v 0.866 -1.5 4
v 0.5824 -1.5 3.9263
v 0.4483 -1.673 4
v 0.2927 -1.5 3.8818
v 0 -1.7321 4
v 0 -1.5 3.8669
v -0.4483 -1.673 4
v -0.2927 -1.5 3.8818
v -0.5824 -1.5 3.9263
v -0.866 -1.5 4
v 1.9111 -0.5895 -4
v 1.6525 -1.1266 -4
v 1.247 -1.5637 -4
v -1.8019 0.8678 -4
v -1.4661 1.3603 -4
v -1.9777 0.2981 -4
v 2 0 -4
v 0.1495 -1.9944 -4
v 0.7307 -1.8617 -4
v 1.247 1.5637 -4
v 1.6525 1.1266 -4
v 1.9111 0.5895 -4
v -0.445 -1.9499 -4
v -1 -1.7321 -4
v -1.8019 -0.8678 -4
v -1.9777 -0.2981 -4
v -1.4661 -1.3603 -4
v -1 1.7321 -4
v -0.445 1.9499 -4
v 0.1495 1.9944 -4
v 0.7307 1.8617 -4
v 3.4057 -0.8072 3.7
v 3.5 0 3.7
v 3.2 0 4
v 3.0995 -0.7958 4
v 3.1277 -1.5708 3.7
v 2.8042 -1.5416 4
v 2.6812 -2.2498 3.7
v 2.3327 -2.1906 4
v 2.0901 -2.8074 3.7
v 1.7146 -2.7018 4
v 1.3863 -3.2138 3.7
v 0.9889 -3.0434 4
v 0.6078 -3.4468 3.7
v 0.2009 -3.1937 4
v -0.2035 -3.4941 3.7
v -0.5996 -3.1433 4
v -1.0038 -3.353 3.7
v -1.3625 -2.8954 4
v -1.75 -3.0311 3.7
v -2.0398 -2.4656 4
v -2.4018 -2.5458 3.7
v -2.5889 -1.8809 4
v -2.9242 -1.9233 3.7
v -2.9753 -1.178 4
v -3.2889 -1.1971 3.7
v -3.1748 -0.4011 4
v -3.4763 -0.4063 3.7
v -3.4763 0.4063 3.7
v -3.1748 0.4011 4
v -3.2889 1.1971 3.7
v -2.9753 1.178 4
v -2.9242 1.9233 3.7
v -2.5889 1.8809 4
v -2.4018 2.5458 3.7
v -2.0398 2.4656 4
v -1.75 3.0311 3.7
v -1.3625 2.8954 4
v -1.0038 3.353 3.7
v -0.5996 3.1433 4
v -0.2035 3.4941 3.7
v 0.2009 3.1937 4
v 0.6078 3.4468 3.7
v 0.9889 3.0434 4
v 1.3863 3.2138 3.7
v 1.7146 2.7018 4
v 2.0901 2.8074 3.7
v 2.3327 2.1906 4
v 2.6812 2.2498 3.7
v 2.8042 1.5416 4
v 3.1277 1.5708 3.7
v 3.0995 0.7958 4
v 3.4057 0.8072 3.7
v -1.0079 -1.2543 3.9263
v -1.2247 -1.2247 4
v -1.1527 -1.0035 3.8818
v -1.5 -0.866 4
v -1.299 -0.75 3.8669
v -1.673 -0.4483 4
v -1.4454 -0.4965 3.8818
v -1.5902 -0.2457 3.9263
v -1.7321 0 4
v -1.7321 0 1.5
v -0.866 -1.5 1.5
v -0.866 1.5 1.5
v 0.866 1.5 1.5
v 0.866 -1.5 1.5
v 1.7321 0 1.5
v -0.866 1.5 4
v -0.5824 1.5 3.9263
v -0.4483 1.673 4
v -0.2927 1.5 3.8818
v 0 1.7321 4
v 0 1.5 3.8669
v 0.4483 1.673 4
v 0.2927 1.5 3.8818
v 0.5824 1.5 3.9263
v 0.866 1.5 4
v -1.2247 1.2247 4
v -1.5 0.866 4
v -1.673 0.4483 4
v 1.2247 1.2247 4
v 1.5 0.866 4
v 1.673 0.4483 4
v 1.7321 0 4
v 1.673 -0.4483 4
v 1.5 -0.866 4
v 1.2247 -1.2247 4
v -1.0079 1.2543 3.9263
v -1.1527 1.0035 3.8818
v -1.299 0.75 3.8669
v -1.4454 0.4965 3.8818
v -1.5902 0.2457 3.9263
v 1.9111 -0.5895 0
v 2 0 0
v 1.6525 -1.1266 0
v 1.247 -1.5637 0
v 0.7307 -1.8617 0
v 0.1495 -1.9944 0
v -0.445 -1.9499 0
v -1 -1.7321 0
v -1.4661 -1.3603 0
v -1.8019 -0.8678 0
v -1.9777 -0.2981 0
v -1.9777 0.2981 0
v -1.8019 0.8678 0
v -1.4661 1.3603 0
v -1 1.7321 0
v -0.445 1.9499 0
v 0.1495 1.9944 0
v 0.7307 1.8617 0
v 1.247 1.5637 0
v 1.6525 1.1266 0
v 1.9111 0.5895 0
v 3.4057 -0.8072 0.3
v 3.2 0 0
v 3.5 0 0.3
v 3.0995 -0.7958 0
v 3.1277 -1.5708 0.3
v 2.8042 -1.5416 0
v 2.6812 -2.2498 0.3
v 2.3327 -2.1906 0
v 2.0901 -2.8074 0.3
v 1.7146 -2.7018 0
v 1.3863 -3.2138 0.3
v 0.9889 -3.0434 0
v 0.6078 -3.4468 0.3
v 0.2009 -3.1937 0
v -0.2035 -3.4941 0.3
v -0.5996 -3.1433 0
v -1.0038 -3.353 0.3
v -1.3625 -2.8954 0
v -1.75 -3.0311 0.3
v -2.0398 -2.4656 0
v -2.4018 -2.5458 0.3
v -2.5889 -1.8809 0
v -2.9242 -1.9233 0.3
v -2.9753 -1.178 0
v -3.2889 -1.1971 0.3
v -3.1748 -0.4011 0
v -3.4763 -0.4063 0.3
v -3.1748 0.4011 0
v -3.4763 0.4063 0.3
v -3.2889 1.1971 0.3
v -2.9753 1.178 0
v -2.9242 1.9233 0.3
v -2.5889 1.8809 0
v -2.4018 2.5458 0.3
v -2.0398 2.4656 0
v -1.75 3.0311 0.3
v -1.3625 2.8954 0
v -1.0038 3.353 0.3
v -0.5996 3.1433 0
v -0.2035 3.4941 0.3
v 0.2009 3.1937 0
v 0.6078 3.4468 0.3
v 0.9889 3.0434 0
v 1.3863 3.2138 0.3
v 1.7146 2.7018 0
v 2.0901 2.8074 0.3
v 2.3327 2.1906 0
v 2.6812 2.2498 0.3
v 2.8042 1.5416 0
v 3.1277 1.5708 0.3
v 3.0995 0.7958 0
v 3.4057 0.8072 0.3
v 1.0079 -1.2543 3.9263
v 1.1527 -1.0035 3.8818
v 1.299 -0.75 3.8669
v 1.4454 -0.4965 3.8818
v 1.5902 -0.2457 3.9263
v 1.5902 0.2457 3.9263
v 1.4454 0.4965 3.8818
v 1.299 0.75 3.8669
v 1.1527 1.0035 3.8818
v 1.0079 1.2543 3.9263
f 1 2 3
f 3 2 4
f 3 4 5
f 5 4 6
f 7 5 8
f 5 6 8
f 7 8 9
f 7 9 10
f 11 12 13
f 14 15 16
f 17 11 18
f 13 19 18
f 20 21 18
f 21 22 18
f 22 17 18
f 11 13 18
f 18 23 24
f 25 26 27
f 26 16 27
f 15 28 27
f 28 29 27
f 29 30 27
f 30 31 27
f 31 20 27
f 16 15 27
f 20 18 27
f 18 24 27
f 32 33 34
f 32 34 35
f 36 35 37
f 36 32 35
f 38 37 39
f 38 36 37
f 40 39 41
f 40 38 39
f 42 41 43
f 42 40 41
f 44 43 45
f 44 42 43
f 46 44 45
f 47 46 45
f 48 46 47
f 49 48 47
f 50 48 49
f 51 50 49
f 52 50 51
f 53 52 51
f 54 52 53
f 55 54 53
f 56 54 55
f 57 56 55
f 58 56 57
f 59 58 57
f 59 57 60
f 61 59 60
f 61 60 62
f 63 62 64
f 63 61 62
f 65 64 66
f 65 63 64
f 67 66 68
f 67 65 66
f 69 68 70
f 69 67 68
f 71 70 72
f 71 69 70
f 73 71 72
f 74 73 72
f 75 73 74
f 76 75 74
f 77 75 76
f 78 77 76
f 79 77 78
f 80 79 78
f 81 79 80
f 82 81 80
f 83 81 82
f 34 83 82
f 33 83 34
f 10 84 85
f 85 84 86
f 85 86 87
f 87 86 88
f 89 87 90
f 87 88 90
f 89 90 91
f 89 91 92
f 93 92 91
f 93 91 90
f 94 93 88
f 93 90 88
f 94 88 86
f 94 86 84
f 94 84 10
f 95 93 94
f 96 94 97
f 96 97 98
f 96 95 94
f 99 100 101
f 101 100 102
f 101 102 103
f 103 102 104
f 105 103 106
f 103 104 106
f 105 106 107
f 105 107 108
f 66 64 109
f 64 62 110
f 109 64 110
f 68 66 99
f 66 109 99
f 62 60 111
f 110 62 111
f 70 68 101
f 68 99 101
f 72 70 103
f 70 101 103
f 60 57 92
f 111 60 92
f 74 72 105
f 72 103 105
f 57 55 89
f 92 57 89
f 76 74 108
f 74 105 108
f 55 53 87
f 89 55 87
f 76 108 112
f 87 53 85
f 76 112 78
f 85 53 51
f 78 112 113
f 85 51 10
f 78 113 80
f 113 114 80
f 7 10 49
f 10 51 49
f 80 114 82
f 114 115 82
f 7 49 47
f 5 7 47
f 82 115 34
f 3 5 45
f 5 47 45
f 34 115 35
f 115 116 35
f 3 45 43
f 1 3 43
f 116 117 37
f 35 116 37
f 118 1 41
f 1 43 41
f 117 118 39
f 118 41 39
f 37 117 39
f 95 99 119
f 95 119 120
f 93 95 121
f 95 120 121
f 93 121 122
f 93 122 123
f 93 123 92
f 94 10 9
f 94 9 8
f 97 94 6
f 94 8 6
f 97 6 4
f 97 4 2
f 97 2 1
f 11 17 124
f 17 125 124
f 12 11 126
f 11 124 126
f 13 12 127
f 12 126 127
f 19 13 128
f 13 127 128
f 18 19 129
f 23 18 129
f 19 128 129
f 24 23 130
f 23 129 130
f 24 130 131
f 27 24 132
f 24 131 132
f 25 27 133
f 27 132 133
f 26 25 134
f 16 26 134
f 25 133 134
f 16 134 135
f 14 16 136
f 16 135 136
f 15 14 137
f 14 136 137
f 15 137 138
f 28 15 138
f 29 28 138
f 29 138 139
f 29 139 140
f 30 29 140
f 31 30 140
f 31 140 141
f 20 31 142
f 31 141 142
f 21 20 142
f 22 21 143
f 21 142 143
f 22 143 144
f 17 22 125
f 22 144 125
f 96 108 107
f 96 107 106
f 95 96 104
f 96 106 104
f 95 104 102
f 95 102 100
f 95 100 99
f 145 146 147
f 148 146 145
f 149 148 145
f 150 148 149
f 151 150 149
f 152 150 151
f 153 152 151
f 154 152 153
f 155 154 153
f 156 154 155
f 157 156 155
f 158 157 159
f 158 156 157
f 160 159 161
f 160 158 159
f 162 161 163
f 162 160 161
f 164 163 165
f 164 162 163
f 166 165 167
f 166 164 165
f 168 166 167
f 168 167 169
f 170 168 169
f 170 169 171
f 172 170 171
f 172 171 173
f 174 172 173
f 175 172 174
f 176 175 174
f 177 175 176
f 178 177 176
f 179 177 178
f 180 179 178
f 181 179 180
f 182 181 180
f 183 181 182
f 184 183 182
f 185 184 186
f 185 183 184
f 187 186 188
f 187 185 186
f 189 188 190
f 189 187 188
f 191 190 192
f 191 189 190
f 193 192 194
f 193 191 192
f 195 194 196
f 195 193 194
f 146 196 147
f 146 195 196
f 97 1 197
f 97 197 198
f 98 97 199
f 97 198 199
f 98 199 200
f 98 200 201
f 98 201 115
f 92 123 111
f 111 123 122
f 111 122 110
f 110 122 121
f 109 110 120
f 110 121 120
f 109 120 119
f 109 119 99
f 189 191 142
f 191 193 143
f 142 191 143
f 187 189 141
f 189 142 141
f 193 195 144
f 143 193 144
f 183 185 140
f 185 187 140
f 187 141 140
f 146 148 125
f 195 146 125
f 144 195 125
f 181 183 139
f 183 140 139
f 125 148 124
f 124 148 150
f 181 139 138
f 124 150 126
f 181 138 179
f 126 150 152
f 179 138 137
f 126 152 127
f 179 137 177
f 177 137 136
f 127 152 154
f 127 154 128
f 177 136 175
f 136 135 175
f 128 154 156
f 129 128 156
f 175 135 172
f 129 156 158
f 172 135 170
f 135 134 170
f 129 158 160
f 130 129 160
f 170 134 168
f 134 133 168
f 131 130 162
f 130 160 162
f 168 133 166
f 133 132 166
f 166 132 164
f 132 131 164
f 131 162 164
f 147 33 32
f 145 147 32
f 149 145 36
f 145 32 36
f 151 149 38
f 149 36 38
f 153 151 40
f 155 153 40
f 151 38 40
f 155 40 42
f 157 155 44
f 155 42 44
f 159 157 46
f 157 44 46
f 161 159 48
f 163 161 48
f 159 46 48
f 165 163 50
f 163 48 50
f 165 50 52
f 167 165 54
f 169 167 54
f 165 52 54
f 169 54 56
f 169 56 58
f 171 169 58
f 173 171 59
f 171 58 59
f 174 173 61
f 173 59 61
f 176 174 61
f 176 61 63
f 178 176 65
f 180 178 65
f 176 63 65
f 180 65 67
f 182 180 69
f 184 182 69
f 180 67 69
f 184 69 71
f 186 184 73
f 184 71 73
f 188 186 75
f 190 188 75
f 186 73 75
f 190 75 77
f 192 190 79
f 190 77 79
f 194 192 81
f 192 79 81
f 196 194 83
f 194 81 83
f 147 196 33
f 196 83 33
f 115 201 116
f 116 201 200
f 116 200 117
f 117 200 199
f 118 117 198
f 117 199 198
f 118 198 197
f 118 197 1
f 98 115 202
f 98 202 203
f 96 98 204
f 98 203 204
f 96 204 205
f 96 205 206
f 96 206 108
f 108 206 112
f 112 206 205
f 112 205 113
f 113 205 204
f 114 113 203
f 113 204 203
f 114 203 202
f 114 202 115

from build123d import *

# Parameters (mm, degrees)
F3_DEPTH = 2.5
F6_SIZE  = 0.3


with BuildPart() as f1:
    # F0 (on Front) → F1 (revolve)
    with BuildSketch(Plane.XZ):
        Polygon((3.5, 4), (0, 4), (0, -4), (2, -4), (2, 0), (3.5, 0), align=None)
    revolve(axis=Axis((0, 0, 0), (0, 0, -1)))

    # F2 (on face) → F3 (cut)
    with BuildSketch(Plane.XY.offset(4)):
        Polygon((1.732051, 0), (0.866025, 1.5), (-0.866025, 1.5), (-1.732051, 0), (-0.866025, -1.5), (0.866025, -1.5), align=None)
    extrude(amount=-F3_DEPTH, mode=Mode.SUBTRACT)

    # F4 (on Front) → F5 (revolve, cut)
    with BuildSketch(Plane.XZ):
        with BuildLine():
            Line((0, 3.5), (0, 10))
            ThreePointArc((0, 10), (-3.25, 6.75), (0, 3.5))
        make_face()
    revolve(axis=Axis((0, 0, 3.375), (0, 0, -1)), mode=Mode.SUBTRACT)

    # F6
    f6_edges = [f1.edges().sort_by_distance(p)[0] for p in [
        (-3.5, 0, 4),
        (-3.5, 0, 0),
    ]]
    chamfer(f6_edges, length=F6_SIZE)


solid = f1.part
